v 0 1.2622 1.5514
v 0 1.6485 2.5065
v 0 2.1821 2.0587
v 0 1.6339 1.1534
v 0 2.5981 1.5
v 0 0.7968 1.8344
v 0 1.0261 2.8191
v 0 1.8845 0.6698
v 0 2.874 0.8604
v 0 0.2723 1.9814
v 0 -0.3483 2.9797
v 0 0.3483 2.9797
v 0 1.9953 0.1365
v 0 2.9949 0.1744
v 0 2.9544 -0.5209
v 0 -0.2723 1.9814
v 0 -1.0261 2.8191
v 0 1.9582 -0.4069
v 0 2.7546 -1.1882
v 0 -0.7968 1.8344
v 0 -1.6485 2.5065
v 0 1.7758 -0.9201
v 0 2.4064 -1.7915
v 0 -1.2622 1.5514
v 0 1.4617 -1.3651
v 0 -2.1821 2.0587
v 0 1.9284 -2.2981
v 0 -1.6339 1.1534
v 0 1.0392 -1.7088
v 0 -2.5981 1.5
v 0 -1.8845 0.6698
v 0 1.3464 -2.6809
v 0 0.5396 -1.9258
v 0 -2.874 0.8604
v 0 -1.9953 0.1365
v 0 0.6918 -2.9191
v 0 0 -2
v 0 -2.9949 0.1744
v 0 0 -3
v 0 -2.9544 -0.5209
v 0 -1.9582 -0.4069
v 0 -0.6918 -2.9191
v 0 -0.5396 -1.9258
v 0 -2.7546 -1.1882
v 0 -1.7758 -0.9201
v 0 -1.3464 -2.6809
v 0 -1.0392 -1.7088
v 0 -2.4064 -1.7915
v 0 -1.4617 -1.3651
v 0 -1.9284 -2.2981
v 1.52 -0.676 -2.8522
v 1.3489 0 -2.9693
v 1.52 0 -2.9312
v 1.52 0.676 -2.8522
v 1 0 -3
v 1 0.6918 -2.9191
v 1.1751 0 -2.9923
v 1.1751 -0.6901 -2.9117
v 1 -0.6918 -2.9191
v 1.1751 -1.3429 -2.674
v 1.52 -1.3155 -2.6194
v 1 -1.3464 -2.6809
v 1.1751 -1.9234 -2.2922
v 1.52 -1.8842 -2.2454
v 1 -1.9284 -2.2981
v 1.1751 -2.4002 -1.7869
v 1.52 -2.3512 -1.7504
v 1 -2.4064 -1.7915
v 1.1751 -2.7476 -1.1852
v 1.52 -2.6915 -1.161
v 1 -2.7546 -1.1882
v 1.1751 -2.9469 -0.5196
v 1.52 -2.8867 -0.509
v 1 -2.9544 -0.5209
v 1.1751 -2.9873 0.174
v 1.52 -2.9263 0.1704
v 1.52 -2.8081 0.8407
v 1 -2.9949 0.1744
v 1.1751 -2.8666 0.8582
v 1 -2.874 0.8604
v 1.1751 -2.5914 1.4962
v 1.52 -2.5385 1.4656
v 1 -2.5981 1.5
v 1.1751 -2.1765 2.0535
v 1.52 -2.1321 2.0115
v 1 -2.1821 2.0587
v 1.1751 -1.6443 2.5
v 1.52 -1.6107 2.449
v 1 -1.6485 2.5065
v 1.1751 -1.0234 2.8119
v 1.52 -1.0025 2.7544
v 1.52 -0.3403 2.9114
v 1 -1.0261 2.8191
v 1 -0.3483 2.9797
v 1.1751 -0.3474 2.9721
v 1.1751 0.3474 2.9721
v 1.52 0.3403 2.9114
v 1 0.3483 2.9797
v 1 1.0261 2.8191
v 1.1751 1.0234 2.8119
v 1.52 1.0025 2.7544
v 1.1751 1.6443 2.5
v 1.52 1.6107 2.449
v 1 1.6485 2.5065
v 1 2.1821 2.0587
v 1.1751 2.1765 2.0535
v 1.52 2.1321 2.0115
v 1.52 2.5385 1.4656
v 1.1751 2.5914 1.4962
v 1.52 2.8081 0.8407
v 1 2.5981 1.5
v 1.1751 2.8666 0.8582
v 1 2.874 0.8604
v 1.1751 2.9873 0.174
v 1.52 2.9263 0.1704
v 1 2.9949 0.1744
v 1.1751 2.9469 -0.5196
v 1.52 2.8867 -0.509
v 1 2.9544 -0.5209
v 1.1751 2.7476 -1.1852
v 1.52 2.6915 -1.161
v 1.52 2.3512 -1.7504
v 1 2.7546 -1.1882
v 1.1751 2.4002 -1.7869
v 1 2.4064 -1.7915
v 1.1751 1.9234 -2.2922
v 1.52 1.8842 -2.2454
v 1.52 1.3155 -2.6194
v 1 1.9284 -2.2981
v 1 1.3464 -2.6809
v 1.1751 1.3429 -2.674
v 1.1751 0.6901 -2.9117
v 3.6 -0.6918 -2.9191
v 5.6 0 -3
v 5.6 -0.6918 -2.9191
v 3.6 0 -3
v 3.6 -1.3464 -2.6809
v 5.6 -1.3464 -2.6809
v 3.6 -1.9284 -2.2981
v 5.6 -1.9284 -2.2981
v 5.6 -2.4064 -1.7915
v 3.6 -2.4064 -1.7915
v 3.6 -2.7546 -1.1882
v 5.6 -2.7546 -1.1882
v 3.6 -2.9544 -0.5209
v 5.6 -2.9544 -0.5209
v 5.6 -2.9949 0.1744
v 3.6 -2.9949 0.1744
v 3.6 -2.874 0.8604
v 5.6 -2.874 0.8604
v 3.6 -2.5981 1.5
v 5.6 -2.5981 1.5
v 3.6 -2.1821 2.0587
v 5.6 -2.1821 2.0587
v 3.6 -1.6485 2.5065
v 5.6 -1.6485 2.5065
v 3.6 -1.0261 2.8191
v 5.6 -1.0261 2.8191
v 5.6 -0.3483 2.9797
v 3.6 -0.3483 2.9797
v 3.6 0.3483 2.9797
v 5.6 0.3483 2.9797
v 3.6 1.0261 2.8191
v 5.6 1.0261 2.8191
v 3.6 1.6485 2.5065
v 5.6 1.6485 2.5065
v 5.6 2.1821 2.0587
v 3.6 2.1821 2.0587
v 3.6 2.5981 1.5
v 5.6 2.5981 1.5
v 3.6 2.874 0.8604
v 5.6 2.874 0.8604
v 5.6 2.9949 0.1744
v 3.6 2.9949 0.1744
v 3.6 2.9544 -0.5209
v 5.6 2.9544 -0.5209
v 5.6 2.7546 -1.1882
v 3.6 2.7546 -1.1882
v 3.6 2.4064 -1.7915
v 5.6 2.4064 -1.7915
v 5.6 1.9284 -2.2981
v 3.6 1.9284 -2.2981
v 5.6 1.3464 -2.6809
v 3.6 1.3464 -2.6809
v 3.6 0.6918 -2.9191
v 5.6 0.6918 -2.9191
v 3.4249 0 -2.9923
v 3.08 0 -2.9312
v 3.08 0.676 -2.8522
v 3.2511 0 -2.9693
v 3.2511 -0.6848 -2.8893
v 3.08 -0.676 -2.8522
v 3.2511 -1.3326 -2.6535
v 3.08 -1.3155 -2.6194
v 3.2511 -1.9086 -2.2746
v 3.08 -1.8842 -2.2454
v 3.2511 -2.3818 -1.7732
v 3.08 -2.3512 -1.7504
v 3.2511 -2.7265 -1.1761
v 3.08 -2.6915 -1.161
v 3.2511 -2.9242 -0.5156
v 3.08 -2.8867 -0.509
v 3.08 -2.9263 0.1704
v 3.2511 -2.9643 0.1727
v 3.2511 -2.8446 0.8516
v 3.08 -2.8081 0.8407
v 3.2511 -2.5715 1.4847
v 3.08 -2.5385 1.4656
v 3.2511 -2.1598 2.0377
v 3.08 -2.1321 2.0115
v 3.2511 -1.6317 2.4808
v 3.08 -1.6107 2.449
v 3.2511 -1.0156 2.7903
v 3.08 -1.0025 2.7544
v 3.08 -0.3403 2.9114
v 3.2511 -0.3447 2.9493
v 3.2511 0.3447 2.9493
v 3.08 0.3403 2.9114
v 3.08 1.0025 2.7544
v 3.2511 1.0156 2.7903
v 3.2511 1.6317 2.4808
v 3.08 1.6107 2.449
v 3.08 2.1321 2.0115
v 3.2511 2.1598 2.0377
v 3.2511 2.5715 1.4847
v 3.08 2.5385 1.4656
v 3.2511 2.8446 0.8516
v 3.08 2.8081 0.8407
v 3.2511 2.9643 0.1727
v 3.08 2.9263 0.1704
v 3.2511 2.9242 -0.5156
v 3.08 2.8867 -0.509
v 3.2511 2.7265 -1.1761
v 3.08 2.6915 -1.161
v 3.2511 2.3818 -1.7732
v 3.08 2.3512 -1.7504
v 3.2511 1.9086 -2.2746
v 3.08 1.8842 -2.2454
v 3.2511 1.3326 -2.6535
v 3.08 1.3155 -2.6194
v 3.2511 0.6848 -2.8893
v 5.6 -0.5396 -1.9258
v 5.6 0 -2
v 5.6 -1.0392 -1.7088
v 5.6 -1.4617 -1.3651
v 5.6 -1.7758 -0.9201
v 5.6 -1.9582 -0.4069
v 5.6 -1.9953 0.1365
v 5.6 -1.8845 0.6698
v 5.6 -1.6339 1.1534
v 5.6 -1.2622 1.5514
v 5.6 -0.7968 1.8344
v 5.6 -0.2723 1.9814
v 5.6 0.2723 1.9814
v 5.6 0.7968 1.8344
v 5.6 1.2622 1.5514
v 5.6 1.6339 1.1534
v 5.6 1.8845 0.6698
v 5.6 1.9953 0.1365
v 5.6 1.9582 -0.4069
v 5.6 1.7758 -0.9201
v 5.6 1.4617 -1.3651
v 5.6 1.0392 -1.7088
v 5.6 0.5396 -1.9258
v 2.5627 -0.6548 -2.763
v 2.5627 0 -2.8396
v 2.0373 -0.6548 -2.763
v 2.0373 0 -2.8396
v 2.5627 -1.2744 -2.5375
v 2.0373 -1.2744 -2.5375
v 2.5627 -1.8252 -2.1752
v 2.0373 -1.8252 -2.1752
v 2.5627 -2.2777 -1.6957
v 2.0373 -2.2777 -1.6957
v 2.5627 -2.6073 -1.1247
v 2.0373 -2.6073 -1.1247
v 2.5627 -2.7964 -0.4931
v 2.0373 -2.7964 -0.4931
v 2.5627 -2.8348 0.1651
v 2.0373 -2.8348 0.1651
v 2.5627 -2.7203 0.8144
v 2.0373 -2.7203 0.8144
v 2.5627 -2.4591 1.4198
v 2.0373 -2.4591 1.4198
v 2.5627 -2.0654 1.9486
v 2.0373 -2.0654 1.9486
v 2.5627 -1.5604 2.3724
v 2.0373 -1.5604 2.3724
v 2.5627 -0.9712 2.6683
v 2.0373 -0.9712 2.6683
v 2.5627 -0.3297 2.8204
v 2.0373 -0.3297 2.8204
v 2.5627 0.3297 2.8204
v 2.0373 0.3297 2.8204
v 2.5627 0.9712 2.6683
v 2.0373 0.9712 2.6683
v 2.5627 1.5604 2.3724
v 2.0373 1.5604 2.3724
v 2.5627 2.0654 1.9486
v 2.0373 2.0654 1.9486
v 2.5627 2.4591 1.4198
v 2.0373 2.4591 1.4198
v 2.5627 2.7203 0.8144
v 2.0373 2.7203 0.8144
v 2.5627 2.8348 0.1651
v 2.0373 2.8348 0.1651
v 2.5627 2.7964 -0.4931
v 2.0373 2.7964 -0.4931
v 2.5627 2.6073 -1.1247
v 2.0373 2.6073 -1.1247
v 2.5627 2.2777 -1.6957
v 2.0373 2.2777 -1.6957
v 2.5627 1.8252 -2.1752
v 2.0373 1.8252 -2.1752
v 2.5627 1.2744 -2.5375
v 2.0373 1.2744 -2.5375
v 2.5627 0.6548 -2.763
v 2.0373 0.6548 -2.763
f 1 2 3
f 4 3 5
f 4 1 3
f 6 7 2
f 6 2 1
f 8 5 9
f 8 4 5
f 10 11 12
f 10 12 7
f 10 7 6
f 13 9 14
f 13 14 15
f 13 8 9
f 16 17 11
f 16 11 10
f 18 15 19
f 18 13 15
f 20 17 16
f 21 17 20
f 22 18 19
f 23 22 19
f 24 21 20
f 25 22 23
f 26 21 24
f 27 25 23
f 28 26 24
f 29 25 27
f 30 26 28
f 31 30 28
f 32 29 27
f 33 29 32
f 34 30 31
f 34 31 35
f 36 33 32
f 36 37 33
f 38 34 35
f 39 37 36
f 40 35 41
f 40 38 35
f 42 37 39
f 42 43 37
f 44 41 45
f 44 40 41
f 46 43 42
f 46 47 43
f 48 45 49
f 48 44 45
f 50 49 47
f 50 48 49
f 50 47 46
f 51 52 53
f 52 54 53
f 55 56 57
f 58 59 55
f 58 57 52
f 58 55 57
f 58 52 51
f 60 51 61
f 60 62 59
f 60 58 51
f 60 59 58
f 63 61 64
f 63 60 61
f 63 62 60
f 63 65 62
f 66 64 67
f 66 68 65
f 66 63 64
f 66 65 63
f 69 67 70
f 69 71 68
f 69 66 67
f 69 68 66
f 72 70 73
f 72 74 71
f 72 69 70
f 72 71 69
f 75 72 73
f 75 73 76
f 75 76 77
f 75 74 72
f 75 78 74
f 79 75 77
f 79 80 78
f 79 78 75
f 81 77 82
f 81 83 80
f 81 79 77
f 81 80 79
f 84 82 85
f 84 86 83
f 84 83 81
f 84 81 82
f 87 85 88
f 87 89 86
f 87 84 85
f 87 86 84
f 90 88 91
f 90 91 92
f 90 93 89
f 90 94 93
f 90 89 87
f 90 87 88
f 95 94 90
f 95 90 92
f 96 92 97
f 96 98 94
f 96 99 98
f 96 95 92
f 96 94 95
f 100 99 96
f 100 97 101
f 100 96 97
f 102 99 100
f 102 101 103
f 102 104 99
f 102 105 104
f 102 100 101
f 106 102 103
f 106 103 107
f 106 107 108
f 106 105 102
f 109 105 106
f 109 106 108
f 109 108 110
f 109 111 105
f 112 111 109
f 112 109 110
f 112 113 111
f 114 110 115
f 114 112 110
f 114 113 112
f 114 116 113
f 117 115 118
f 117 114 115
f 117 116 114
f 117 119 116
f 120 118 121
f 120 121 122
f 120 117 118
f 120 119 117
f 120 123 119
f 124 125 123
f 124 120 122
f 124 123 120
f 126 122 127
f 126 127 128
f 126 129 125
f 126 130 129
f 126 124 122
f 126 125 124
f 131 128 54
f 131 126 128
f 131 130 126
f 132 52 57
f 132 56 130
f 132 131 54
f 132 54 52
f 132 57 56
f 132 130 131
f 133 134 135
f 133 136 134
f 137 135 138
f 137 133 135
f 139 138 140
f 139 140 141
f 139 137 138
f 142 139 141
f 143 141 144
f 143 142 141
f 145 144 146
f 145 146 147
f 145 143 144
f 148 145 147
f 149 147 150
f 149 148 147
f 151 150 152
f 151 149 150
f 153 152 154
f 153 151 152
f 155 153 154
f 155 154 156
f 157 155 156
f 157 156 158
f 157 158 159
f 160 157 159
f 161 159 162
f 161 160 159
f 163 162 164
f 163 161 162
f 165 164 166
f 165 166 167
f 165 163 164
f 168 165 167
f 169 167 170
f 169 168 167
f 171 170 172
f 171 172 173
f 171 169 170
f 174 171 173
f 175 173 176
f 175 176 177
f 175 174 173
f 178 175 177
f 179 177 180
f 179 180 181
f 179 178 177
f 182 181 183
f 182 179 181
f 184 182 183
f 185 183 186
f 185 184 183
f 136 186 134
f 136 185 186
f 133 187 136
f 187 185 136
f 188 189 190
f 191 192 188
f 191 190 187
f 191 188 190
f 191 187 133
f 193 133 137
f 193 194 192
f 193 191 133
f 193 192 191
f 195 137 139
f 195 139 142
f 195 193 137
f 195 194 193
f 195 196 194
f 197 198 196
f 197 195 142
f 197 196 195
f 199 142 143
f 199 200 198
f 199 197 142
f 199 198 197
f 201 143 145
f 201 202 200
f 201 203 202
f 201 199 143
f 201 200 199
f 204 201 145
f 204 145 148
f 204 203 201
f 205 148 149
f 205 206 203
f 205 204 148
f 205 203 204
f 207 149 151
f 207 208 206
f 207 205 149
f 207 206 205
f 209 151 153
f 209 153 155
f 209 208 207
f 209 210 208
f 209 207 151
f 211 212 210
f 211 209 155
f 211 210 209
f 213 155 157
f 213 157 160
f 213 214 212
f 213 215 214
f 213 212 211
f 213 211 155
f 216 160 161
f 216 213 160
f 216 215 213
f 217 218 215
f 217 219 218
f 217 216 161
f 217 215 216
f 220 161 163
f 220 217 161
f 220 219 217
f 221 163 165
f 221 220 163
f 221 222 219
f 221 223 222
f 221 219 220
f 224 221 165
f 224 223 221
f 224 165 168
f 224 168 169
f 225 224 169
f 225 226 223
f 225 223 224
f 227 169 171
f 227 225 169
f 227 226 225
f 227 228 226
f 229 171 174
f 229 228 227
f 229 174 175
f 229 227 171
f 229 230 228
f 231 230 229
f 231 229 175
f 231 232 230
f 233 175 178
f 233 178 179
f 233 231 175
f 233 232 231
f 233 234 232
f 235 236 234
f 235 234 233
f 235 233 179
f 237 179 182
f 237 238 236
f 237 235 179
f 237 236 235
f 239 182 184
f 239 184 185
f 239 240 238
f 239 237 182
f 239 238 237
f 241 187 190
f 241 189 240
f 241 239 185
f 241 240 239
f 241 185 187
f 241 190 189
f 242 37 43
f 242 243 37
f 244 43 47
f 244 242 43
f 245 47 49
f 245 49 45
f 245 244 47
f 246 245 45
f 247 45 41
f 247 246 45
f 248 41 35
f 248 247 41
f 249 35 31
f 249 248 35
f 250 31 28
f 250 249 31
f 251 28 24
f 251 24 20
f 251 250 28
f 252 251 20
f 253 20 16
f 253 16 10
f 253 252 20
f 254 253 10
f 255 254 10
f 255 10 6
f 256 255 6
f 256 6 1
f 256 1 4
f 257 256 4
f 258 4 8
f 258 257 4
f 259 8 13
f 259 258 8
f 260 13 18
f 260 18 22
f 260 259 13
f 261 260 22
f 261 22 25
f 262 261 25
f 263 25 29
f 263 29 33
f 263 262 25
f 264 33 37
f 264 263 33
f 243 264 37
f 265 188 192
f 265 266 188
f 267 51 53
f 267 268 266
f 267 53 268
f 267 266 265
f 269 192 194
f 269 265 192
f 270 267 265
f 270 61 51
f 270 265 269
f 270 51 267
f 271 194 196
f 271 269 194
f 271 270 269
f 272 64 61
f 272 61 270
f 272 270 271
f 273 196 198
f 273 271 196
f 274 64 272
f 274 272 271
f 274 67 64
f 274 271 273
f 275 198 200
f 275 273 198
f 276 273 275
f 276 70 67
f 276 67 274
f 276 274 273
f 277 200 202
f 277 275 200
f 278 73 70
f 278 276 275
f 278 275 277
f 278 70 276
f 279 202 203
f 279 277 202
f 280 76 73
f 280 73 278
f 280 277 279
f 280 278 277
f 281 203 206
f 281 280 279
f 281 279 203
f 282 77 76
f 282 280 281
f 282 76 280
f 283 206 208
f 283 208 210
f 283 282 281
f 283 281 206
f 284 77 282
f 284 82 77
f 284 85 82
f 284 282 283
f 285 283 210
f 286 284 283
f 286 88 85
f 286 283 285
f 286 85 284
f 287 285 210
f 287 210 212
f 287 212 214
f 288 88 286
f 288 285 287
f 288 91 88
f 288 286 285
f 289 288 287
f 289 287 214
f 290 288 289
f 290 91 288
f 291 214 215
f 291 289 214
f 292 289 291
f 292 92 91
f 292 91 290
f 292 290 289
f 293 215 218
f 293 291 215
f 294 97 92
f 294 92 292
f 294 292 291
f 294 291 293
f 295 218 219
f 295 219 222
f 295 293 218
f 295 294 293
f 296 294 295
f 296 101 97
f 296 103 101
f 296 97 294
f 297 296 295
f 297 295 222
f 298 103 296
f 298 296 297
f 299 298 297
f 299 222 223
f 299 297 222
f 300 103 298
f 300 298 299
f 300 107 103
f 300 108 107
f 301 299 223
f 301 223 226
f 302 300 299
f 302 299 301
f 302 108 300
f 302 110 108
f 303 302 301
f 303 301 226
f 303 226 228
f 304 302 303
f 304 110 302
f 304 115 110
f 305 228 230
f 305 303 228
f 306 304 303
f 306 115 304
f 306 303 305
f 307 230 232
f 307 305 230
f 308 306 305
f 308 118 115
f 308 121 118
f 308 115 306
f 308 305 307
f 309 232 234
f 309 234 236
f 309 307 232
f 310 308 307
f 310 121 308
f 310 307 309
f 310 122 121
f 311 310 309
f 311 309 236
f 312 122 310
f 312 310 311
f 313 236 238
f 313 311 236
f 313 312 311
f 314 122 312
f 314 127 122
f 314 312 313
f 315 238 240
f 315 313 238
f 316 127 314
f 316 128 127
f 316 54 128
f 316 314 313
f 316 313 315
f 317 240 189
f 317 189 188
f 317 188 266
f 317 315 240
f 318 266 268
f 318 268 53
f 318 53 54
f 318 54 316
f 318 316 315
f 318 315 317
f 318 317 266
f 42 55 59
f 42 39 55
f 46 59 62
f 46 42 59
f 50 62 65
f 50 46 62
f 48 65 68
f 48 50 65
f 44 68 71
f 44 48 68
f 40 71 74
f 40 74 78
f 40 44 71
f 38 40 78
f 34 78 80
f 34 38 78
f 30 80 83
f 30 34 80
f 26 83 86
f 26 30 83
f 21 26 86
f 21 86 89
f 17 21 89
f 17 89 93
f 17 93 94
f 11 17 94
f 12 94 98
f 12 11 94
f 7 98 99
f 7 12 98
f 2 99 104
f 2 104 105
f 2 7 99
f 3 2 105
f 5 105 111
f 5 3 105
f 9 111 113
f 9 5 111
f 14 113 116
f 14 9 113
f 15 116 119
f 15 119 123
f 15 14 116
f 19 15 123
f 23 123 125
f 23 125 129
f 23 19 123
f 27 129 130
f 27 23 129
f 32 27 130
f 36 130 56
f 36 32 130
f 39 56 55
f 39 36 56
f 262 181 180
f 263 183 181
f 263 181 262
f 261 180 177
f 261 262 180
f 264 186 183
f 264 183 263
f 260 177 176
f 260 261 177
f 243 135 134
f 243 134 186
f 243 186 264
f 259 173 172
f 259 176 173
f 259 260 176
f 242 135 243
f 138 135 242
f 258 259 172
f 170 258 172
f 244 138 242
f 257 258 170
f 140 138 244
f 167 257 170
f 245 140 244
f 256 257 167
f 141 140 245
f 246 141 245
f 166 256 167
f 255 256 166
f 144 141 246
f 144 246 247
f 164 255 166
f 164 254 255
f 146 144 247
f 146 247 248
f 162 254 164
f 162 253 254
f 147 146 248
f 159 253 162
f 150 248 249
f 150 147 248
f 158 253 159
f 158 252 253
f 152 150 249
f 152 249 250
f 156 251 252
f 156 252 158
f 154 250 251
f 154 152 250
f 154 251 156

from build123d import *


with BuildPart() as part:
    # Sketch1 → Revolve1 (revolve)
    with BuildSketch(Plane.XY, mode=Mode.PRIVATE) as revolve1_sk:
        with BuildLine():
            Line((0, 2), (5.6, 2))
            Line((5.6, 2), (5.6, 3))
            Line((5.6, 3), (3.6, 3))
            ThreePointArc((3.6, 3), (3.337735311, 2.982729743), (3.08, 2.931217233))
            ThreePointArc((3.08, 2.931217233), (2.3, 2.828043082), (1.52, 2.931217233))
            ThreePointArc((1.52, 2.931217233), (1.262264689, 2.982729743), (1, 3))
            Line((1, 3), (0, 3))
            Line((0, 3), (0, 2))
        make_face()
    revolve(revolve1_sk.sketch.rotate(Axis((5.88, 0, 0), (-1, 0, 0)), 90), axis=Axis((5.88, 0, 0), (-1, 0, 0)))  # turned: the seam where the file's is


solid = part.part
